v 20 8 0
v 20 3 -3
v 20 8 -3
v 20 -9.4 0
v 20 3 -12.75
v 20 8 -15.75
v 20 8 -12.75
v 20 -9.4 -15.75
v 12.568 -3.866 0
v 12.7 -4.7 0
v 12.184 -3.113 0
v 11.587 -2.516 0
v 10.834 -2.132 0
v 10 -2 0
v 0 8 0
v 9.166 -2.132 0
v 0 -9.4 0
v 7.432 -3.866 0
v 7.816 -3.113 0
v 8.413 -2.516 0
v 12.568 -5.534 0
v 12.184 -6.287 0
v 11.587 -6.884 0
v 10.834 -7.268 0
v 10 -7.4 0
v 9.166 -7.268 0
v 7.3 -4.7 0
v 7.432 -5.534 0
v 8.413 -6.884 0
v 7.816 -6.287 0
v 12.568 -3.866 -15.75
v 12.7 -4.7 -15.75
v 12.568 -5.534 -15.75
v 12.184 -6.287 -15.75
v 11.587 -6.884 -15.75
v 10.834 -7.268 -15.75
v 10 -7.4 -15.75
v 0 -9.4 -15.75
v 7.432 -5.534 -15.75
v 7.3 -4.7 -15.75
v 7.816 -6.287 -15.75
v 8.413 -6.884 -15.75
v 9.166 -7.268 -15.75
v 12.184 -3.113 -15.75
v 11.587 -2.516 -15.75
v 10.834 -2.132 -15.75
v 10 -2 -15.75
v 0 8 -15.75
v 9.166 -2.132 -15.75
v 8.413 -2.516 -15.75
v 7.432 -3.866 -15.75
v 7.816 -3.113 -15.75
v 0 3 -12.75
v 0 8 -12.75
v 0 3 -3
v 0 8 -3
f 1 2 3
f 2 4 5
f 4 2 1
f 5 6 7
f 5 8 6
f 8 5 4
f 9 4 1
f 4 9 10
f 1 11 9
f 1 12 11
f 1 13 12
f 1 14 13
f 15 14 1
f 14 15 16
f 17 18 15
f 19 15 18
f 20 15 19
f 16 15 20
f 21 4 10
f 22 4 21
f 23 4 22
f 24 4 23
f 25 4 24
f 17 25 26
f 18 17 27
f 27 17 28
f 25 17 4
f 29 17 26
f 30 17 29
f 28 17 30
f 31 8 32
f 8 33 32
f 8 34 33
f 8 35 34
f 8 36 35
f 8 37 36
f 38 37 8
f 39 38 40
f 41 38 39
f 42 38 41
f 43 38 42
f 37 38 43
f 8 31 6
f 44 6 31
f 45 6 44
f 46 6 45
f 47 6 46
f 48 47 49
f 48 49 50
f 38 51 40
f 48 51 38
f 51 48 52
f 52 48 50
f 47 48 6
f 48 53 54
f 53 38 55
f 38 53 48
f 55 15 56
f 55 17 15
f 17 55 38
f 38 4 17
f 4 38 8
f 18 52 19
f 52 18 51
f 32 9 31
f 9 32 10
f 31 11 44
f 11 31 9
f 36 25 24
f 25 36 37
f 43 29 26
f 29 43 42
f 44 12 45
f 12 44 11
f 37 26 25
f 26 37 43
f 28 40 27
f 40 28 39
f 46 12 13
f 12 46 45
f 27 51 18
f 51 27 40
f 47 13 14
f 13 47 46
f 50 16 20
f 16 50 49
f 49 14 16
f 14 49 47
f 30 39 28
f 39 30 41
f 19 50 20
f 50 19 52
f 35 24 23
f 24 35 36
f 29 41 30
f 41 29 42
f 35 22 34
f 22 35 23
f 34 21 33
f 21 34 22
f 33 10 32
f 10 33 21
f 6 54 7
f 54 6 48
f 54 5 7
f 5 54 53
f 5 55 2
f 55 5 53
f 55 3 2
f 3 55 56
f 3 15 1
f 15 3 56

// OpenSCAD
// [FL_INDEX: keywords="openscad, 3d_parametric, M2_dial_indicator_mount, csg_solid" | COT="Parametric OpenSCAD design from 3DCodeverse"]
// Title: M2 dial indicator mount

/* [General] */
build = "dialmount"; // [dialmount, clamptest]

/* [Clamp] */
// How much extra slop for the clamp. Use the clamptest print to determine the proper value.
clamp_clearance = 0.1;

// How far back you want the clamp to extend. 5mm is about the furthest you can go without hitting the x-axis V rail.
lip_depth = 5;

// How long you want your clamp to be.
clamp_length = 20;

// How thick the clamp walls should be.
wall_thickness = 3;

/* [Indicator] */
// Outer diameter of the indicator dial shaft.
shaft_od = 5;

// How much extra space you need to fit.
shaft_clearance = .2;

// How far off from the gantry face you want the edge of the shaft hole to be offset.
hole_border = 2;



/* [Hidden] */
// Thickness of the gantry along the front.
clamp_gap = 9.65;
hole_radius = shaft_od / 2 + shaft_clearance;
hole_center = hole_border + hole_radius;
slop = 0.1;

module clamp(h, c = clamp_clearance) {
  linear_extrude(height = h)
  difference() {
    translate([-wall_thickness, -wall_thickness])
    square([clamp_gap + c + 2*wall_thickness, lip_depth + wall_thickness]);

    square([clamp_gap + c, lip_depth + slop]);
  }
}

clamp_height = 2*wall_thickness + clamp_gap + clamp_clearance;

module dial_mount() {
  // clamp
  rotate([0, 90, 0])
  translate([wall_thickness, wall_thickness, 0])
  clamp(clamp_length);

  // shelf
  shelf_length = 2 * (hole_border + hole_radius);

  difference() {
    translate([0, -shelf_length, -clamp_height])
    cube([clamp_length, shelf_length, clamp_height]);

    translate([clamp_length / 2, -hole_center, -clamp_height - slop])
    cylinder(h = clamp_height + 2 * slop, r = hole_radius, $fn = 20);
  }
}

module clamp_test() {
  for (i = [0 : 3]) {
    translate([18 * i, 0]) clamp(10, i * .1);
  }
}

if (build == "dialmount") dial_mount();
else clamp_test();
